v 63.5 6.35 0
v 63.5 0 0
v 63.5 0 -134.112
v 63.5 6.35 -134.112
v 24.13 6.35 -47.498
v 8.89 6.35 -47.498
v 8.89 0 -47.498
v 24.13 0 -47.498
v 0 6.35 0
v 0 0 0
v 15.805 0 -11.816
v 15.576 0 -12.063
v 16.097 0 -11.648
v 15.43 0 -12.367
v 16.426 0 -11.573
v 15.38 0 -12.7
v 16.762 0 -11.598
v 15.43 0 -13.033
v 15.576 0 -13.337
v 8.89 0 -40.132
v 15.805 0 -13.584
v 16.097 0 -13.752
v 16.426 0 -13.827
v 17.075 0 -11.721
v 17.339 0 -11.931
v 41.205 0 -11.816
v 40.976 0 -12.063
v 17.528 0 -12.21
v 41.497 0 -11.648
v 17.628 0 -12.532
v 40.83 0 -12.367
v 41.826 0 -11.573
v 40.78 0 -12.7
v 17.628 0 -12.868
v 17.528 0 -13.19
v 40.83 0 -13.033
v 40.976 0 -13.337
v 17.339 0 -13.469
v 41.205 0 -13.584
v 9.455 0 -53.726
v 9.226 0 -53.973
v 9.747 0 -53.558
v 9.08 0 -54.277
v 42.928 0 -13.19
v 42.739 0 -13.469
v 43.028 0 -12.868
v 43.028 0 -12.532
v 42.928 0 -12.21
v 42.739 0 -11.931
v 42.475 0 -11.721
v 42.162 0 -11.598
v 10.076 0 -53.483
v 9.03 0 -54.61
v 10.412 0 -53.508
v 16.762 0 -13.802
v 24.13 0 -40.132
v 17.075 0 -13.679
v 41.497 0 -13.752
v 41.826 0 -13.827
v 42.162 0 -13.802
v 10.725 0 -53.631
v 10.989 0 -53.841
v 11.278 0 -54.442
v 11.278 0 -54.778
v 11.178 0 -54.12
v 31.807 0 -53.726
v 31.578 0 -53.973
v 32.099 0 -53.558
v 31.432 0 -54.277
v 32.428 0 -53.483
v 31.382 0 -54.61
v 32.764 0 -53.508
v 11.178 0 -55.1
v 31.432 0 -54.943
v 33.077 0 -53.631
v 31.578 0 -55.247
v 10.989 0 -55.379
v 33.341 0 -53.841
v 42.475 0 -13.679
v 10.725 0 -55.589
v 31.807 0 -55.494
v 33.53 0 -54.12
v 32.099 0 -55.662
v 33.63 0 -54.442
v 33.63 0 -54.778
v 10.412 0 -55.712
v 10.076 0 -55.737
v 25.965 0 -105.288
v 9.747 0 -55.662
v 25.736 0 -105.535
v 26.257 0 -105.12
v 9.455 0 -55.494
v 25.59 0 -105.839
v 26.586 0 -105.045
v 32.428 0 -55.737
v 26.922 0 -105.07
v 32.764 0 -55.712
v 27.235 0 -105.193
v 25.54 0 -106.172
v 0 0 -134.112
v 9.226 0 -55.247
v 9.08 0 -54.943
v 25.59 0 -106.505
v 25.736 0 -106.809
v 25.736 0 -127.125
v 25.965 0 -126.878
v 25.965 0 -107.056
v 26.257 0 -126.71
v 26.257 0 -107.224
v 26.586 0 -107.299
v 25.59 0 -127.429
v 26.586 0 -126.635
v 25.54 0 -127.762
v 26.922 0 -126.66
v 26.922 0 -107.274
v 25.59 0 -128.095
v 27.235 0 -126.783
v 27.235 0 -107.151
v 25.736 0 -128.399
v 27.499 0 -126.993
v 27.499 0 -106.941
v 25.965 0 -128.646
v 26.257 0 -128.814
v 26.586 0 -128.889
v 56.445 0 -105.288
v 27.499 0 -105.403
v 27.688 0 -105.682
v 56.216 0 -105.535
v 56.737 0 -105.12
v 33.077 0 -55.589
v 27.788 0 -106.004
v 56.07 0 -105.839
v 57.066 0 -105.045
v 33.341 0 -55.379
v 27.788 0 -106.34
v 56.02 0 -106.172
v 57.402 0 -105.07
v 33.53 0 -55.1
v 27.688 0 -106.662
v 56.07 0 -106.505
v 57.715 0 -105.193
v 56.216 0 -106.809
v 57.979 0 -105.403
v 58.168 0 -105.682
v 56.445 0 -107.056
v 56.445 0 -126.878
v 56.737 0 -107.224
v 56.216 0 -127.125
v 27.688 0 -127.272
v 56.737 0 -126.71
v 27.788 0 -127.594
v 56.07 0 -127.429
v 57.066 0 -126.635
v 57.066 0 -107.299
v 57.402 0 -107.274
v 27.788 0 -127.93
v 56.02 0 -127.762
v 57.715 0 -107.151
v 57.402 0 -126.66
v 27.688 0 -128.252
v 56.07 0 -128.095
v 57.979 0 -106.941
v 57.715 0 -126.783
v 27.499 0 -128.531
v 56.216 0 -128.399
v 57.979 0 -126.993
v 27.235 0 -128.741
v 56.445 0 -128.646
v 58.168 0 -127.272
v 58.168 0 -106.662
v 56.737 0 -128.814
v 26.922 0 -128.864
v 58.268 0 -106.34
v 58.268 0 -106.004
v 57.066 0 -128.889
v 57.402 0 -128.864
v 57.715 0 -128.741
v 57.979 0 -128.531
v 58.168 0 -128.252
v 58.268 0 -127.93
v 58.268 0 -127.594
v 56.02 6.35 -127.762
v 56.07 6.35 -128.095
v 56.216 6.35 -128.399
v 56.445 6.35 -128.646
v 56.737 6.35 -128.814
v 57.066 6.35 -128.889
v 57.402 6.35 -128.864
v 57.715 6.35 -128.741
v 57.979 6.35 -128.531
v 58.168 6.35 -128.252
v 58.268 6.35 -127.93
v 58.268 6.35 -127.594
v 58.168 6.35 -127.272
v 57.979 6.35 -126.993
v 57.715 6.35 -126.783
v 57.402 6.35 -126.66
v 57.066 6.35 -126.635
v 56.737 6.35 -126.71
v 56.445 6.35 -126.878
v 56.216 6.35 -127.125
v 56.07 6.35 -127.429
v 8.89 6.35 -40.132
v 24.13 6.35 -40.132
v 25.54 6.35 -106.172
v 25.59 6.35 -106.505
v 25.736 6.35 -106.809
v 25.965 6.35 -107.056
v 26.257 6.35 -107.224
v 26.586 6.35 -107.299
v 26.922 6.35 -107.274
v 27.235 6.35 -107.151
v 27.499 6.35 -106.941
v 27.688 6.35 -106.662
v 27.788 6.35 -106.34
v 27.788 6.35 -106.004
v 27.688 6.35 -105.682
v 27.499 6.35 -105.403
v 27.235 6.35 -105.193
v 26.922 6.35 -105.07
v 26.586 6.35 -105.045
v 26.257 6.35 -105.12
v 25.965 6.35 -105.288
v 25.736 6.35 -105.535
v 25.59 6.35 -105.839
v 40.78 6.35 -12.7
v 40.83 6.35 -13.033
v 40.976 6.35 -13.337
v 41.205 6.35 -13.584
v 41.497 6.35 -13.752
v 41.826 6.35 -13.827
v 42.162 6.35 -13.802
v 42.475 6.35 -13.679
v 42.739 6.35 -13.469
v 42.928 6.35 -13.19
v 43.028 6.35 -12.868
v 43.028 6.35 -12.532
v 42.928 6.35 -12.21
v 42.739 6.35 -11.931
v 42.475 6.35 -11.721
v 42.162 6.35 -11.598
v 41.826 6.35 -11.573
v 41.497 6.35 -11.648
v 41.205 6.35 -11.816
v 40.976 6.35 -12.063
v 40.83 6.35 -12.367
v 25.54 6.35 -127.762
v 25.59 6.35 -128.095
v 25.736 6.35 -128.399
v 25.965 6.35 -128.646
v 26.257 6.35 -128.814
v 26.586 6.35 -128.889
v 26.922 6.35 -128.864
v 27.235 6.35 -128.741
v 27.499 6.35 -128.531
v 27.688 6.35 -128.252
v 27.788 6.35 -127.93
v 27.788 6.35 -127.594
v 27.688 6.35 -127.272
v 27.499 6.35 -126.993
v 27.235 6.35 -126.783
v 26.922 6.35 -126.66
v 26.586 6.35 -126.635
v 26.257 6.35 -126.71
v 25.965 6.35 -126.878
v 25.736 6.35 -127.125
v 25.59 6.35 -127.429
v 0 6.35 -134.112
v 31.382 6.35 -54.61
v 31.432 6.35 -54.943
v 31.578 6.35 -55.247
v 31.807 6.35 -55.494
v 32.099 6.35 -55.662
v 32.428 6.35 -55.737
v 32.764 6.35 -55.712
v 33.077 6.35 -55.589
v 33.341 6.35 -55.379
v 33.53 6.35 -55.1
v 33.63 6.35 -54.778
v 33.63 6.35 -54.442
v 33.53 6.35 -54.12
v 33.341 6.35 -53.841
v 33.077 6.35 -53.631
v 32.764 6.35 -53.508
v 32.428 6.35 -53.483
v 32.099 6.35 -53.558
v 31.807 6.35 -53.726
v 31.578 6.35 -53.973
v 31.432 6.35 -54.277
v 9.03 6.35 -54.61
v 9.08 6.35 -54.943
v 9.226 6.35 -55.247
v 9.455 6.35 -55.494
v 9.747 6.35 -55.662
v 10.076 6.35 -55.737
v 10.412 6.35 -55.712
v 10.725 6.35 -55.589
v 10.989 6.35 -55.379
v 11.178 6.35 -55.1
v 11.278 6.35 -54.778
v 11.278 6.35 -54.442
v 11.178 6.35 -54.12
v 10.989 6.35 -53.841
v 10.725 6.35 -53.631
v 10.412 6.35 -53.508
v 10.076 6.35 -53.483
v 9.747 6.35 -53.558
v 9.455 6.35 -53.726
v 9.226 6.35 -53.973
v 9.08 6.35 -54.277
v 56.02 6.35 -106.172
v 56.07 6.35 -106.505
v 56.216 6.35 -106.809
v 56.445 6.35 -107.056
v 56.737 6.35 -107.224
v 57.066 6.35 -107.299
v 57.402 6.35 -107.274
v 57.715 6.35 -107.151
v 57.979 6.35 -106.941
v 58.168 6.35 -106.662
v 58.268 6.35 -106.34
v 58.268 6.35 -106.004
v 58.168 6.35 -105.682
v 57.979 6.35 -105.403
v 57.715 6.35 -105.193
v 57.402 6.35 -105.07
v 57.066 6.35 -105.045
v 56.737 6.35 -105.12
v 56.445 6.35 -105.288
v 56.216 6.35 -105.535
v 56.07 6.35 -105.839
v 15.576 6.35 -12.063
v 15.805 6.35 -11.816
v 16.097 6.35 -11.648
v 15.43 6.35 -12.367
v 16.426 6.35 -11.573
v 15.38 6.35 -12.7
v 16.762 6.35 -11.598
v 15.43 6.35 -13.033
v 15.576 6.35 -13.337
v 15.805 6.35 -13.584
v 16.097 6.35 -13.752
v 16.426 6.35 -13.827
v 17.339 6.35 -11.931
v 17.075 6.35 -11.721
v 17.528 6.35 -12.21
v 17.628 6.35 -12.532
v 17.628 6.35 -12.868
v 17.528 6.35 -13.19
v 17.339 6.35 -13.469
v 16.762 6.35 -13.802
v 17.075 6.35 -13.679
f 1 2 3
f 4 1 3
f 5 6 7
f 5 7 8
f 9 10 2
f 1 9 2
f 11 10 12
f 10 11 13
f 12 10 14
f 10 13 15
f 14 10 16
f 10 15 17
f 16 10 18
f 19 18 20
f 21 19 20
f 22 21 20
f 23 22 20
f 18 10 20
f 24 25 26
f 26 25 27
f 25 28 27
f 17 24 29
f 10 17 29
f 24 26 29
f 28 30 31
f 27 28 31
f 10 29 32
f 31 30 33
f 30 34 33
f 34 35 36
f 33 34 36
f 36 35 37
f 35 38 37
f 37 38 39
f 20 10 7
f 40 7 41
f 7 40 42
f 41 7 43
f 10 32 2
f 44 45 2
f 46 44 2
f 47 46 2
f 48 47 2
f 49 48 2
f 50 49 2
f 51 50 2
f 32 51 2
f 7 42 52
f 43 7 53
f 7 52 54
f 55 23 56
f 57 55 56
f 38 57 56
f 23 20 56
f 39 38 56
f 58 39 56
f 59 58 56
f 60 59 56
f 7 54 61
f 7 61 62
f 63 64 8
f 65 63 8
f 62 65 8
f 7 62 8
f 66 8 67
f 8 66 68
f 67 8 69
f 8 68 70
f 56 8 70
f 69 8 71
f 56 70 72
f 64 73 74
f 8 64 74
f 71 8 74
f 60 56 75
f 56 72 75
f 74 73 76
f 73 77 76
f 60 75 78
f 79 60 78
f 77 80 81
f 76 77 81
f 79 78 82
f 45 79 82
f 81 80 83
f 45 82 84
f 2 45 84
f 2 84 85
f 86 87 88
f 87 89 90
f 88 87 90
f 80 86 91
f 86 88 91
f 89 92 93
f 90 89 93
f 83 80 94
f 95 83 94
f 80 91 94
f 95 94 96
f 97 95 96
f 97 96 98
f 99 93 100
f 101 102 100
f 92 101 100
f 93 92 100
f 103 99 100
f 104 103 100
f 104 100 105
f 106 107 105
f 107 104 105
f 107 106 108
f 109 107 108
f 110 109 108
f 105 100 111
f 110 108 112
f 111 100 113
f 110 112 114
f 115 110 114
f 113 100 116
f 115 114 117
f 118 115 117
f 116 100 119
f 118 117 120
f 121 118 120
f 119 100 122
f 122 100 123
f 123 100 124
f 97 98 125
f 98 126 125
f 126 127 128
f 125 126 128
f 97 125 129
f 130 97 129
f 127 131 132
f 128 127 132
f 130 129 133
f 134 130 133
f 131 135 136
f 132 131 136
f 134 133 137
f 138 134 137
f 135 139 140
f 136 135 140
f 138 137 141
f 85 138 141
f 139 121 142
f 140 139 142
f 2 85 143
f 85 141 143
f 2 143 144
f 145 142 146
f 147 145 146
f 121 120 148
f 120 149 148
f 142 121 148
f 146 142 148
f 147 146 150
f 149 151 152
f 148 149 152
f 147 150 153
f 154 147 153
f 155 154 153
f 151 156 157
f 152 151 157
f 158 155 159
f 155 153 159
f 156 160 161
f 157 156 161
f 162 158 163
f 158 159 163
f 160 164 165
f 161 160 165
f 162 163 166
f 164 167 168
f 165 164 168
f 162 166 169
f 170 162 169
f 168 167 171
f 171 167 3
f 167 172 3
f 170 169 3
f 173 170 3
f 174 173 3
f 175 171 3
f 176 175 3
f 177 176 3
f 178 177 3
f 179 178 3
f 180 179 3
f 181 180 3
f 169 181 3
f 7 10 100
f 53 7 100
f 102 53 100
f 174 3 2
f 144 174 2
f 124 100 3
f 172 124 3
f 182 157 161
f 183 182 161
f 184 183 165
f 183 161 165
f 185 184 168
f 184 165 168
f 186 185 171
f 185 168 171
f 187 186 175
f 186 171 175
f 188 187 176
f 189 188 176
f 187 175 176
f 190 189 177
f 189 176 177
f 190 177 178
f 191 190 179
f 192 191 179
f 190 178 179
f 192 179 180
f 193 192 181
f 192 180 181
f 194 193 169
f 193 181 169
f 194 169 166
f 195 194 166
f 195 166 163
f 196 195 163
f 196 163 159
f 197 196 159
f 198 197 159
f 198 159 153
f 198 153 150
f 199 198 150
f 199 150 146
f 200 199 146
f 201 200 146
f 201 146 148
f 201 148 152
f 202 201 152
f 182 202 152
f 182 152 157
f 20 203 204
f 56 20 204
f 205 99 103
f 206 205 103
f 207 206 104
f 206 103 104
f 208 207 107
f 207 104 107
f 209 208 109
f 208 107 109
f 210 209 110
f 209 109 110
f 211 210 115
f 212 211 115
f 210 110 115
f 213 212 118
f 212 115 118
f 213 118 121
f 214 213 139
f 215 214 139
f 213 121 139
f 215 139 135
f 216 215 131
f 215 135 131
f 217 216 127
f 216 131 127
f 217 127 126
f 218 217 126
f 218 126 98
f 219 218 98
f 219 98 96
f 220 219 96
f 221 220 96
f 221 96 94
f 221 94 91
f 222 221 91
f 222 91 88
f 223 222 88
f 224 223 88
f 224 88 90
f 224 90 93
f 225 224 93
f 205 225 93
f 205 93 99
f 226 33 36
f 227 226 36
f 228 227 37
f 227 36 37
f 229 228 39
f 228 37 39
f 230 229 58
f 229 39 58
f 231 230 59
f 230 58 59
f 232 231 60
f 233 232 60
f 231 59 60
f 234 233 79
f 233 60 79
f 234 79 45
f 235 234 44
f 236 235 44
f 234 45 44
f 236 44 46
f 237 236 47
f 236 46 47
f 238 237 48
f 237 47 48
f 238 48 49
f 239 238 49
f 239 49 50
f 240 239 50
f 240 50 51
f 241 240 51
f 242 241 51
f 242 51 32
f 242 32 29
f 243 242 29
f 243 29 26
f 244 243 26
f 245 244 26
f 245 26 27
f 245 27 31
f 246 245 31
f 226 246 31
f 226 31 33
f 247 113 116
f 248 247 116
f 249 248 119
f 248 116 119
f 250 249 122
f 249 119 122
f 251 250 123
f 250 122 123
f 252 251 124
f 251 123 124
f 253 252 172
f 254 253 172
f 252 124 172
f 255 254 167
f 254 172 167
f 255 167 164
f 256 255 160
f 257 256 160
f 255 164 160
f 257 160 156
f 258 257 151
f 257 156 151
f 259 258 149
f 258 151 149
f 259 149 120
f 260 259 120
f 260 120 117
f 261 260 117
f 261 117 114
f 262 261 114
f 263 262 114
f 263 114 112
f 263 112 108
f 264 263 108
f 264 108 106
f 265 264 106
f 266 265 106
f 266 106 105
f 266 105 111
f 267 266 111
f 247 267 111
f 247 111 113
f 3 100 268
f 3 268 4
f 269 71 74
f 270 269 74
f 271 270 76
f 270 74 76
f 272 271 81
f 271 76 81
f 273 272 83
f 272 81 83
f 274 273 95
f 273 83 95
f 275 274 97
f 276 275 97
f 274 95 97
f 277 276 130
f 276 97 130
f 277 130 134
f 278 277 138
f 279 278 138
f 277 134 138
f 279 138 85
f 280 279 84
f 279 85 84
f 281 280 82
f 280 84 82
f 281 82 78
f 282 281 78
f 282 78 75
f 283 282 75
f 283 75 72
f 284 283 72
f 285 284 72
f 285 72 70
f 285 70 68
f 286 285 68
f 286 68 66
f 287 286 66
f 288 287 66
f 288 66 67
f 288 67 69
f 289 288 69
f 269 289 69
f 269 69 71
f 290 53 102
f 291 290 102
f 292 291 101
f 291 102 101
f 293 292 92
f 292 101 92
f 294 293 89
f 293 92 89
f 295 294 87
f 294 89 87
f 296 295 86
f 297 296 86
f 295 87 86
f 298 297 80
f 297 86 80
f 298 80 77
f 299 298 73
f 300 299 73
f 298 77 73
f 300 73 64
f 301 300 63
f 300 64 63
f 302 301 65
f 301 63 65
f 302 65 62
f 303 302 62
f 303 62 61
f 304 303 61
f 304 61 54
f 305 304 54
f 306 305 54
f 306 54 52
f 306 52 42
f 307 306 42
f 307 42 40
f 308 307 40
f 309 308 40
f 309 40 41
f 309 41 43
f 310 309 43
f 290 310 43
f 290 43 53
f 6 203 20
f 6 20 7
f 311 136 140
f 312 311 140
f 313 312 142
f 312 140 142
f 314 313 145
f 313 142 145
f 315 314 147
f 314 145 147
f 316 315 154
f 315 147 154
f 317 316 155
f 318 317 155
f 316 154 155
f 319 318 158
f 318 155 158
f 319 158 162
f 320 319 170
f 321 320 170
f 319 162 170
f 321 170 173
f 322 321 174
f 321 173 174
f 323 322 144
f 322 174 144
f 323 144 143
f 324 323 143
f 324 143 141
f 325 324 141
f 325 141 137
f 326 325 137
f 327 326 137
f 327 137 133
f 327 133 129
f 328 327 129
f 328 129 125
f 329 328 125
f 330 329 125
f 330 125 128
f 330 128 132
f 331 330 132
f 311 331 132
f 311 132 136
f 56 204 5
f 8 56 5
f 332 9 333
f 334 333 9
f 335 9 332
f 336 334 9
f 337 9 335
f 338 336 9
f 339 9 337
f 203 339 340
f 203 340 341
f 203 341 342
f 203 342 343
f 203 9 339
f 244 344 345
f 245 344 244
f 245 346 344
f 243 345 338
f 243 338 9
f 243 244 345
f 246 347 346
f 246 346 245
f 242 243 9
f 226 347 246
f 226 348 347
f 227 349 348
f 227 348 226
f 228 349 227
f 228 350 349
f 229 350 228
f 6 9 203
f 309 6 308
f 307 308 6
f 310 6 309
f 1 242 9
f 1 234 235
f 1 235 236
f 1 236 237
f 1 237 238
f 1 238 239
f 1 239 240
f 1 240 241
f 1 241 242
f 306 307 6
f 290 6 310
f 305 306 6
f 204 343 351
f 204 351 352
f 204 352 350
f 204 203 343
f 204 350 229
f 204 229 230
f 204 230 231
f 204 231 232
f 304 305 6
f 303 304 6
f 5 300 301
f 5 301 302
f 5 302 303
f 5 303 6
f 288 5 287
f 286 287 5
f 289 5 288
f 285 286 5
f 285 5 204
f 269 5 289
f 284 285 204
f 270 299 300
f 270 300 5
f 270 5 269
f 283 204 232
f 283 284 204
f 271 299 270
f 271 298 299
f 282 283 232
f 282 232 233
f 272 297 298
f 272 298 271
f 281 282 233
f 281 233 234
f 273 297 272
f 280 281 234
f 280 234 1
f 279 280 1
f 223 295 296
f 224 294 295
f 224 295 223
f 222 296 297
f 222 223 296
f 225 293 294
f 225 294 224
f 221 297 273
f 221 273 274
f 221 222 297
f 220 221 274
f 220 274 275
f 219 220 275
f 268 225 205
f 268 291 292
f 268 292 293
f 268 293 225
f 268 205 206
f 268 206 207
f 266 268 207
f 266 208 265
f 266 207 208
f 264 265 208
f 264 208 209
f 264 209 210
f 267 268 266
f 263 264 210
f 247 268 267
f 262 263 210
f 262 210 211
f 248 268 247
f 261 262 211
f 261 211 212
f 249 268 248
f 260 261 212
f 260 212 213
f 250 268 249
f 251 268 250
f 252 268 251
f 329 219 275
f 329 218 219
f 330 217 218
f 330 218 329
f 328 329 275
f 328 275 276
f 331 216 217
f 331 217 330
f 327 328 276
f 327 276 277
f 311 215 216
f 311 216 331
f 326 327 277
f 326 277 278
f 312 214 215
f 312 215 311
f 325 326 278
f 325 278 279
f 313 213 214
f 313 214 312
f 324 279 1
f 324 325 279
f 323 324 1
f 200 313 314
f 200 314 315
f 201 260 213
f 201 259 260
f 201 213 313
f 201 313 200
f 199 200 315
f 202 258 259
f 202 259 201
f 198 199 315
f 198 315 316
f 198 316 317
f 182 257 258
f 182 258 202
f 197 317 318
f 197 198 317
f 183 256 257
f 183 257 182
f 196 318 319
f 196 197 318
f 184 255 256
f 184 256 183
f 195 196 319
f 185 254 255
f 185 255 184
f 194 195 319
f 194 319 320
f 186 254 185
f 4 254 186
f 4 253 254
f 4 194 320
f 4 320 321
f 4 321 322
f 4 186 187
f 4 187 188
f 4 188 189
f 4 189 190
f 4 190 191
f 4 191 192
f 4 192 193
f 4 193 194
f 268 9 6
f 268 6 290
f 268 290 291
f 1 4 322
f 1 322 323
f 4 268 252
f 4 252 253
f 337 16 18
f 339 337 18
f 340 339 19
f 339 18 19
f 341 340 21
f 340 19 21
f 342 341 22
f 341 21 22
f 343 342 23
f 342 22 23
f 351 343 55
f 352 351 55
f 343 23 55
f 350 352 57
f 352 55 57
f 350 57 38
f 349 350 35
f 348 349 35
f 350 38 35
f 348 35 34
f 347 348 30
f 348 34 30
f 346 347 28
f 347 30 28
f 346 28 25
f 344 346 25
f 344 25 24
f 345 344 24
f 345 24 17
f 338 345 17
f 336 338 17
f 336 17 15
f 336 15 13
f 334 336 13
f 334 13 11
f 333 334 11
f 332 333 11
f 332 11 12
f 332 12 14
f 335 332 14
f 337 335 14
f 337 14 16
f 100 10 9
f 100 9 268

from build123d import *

# Parameters (mm, degrees)
SKETCH1_W             = 63.5
SKETCH1_H             = 134.112
BOSS_EXTRUDE1_DEPTH   = 6.35
SKETCH4_W             = 15.24
SKETCH4_H             = 7.366
CUT_EXTRUDE3_DEPTH    = 7.35
F_4_40_TAPPED_HOLE1_D = 2.2606
F_4_40_TAPPED_HOLE2_D = 2.2606
F_4_40_TAPPED_HOLE3_D = 2.2606


with BuildPart() as part:
    # Sketch1 → Boss-Extrude1 (new body)
    with BuildSketch(Plane(origin=(0, 0, 0), x_dir=(1, 0, 0), z_dir=(0, 1, 0))):
        with Locations((31.75, 67.056)):
            Rectangle(SKETCH1_W, SKETCH1_H)
    extrude(amount=BOSS_EXTRUDE1_DEPTH)

    # Sketch4 → Cut-Extrude3 (cut, through all)
    with BuildSketch(Plane(origin=(0, 6.35, 0), x_dir=(1, 0, 0), z_dir=(0, 1, 0))):
        with Locations((16.51, 43.815)):
            Rectangle(SKETCH4_W, SKETCH4_H)
    extrude(amount=-CUT_EXTRUDE3_DEPTH, mode=Mode.SUBTRACT)

    # #4-40 Tapped Hole1 (through all)
    with Locations(Plane(origin=(0, 6.35, 0), x_dir=(1, 0, 0), z_dir=(0, 1, 0))):
        with Locations((57.15, 127.762), (57.15, 106.172), (26.67, 106.172), (26.67, 127.762)):
            Hole(F_4_40_TAPPED_HOLE1_D / 2)

    # #4-40 Tapped Hole2 (through all)
    with Locations(Plane(origin=(0, 6.35, 0), x_dir=(1, 0, 0), z_dir=(0, 1, 0))):
        with Locations((32.512, 54.61), (10.16, 54.61)):
            Hole(F_4_40_TAPPED_HOLE2_D / 2)

    # #4-40 Tapped Hole3 (through all)
    with Locations(Plane(origin=(0, 6.35, 0), x_dir=(1, 0, 0), z_dir=(0, 1, 0))):
        with Locations((41.91, 12.7), (16.51, 12.7)):
            Hole(F_4_40_TAPPED_HOLE3_D / 2)


solid = part.part
